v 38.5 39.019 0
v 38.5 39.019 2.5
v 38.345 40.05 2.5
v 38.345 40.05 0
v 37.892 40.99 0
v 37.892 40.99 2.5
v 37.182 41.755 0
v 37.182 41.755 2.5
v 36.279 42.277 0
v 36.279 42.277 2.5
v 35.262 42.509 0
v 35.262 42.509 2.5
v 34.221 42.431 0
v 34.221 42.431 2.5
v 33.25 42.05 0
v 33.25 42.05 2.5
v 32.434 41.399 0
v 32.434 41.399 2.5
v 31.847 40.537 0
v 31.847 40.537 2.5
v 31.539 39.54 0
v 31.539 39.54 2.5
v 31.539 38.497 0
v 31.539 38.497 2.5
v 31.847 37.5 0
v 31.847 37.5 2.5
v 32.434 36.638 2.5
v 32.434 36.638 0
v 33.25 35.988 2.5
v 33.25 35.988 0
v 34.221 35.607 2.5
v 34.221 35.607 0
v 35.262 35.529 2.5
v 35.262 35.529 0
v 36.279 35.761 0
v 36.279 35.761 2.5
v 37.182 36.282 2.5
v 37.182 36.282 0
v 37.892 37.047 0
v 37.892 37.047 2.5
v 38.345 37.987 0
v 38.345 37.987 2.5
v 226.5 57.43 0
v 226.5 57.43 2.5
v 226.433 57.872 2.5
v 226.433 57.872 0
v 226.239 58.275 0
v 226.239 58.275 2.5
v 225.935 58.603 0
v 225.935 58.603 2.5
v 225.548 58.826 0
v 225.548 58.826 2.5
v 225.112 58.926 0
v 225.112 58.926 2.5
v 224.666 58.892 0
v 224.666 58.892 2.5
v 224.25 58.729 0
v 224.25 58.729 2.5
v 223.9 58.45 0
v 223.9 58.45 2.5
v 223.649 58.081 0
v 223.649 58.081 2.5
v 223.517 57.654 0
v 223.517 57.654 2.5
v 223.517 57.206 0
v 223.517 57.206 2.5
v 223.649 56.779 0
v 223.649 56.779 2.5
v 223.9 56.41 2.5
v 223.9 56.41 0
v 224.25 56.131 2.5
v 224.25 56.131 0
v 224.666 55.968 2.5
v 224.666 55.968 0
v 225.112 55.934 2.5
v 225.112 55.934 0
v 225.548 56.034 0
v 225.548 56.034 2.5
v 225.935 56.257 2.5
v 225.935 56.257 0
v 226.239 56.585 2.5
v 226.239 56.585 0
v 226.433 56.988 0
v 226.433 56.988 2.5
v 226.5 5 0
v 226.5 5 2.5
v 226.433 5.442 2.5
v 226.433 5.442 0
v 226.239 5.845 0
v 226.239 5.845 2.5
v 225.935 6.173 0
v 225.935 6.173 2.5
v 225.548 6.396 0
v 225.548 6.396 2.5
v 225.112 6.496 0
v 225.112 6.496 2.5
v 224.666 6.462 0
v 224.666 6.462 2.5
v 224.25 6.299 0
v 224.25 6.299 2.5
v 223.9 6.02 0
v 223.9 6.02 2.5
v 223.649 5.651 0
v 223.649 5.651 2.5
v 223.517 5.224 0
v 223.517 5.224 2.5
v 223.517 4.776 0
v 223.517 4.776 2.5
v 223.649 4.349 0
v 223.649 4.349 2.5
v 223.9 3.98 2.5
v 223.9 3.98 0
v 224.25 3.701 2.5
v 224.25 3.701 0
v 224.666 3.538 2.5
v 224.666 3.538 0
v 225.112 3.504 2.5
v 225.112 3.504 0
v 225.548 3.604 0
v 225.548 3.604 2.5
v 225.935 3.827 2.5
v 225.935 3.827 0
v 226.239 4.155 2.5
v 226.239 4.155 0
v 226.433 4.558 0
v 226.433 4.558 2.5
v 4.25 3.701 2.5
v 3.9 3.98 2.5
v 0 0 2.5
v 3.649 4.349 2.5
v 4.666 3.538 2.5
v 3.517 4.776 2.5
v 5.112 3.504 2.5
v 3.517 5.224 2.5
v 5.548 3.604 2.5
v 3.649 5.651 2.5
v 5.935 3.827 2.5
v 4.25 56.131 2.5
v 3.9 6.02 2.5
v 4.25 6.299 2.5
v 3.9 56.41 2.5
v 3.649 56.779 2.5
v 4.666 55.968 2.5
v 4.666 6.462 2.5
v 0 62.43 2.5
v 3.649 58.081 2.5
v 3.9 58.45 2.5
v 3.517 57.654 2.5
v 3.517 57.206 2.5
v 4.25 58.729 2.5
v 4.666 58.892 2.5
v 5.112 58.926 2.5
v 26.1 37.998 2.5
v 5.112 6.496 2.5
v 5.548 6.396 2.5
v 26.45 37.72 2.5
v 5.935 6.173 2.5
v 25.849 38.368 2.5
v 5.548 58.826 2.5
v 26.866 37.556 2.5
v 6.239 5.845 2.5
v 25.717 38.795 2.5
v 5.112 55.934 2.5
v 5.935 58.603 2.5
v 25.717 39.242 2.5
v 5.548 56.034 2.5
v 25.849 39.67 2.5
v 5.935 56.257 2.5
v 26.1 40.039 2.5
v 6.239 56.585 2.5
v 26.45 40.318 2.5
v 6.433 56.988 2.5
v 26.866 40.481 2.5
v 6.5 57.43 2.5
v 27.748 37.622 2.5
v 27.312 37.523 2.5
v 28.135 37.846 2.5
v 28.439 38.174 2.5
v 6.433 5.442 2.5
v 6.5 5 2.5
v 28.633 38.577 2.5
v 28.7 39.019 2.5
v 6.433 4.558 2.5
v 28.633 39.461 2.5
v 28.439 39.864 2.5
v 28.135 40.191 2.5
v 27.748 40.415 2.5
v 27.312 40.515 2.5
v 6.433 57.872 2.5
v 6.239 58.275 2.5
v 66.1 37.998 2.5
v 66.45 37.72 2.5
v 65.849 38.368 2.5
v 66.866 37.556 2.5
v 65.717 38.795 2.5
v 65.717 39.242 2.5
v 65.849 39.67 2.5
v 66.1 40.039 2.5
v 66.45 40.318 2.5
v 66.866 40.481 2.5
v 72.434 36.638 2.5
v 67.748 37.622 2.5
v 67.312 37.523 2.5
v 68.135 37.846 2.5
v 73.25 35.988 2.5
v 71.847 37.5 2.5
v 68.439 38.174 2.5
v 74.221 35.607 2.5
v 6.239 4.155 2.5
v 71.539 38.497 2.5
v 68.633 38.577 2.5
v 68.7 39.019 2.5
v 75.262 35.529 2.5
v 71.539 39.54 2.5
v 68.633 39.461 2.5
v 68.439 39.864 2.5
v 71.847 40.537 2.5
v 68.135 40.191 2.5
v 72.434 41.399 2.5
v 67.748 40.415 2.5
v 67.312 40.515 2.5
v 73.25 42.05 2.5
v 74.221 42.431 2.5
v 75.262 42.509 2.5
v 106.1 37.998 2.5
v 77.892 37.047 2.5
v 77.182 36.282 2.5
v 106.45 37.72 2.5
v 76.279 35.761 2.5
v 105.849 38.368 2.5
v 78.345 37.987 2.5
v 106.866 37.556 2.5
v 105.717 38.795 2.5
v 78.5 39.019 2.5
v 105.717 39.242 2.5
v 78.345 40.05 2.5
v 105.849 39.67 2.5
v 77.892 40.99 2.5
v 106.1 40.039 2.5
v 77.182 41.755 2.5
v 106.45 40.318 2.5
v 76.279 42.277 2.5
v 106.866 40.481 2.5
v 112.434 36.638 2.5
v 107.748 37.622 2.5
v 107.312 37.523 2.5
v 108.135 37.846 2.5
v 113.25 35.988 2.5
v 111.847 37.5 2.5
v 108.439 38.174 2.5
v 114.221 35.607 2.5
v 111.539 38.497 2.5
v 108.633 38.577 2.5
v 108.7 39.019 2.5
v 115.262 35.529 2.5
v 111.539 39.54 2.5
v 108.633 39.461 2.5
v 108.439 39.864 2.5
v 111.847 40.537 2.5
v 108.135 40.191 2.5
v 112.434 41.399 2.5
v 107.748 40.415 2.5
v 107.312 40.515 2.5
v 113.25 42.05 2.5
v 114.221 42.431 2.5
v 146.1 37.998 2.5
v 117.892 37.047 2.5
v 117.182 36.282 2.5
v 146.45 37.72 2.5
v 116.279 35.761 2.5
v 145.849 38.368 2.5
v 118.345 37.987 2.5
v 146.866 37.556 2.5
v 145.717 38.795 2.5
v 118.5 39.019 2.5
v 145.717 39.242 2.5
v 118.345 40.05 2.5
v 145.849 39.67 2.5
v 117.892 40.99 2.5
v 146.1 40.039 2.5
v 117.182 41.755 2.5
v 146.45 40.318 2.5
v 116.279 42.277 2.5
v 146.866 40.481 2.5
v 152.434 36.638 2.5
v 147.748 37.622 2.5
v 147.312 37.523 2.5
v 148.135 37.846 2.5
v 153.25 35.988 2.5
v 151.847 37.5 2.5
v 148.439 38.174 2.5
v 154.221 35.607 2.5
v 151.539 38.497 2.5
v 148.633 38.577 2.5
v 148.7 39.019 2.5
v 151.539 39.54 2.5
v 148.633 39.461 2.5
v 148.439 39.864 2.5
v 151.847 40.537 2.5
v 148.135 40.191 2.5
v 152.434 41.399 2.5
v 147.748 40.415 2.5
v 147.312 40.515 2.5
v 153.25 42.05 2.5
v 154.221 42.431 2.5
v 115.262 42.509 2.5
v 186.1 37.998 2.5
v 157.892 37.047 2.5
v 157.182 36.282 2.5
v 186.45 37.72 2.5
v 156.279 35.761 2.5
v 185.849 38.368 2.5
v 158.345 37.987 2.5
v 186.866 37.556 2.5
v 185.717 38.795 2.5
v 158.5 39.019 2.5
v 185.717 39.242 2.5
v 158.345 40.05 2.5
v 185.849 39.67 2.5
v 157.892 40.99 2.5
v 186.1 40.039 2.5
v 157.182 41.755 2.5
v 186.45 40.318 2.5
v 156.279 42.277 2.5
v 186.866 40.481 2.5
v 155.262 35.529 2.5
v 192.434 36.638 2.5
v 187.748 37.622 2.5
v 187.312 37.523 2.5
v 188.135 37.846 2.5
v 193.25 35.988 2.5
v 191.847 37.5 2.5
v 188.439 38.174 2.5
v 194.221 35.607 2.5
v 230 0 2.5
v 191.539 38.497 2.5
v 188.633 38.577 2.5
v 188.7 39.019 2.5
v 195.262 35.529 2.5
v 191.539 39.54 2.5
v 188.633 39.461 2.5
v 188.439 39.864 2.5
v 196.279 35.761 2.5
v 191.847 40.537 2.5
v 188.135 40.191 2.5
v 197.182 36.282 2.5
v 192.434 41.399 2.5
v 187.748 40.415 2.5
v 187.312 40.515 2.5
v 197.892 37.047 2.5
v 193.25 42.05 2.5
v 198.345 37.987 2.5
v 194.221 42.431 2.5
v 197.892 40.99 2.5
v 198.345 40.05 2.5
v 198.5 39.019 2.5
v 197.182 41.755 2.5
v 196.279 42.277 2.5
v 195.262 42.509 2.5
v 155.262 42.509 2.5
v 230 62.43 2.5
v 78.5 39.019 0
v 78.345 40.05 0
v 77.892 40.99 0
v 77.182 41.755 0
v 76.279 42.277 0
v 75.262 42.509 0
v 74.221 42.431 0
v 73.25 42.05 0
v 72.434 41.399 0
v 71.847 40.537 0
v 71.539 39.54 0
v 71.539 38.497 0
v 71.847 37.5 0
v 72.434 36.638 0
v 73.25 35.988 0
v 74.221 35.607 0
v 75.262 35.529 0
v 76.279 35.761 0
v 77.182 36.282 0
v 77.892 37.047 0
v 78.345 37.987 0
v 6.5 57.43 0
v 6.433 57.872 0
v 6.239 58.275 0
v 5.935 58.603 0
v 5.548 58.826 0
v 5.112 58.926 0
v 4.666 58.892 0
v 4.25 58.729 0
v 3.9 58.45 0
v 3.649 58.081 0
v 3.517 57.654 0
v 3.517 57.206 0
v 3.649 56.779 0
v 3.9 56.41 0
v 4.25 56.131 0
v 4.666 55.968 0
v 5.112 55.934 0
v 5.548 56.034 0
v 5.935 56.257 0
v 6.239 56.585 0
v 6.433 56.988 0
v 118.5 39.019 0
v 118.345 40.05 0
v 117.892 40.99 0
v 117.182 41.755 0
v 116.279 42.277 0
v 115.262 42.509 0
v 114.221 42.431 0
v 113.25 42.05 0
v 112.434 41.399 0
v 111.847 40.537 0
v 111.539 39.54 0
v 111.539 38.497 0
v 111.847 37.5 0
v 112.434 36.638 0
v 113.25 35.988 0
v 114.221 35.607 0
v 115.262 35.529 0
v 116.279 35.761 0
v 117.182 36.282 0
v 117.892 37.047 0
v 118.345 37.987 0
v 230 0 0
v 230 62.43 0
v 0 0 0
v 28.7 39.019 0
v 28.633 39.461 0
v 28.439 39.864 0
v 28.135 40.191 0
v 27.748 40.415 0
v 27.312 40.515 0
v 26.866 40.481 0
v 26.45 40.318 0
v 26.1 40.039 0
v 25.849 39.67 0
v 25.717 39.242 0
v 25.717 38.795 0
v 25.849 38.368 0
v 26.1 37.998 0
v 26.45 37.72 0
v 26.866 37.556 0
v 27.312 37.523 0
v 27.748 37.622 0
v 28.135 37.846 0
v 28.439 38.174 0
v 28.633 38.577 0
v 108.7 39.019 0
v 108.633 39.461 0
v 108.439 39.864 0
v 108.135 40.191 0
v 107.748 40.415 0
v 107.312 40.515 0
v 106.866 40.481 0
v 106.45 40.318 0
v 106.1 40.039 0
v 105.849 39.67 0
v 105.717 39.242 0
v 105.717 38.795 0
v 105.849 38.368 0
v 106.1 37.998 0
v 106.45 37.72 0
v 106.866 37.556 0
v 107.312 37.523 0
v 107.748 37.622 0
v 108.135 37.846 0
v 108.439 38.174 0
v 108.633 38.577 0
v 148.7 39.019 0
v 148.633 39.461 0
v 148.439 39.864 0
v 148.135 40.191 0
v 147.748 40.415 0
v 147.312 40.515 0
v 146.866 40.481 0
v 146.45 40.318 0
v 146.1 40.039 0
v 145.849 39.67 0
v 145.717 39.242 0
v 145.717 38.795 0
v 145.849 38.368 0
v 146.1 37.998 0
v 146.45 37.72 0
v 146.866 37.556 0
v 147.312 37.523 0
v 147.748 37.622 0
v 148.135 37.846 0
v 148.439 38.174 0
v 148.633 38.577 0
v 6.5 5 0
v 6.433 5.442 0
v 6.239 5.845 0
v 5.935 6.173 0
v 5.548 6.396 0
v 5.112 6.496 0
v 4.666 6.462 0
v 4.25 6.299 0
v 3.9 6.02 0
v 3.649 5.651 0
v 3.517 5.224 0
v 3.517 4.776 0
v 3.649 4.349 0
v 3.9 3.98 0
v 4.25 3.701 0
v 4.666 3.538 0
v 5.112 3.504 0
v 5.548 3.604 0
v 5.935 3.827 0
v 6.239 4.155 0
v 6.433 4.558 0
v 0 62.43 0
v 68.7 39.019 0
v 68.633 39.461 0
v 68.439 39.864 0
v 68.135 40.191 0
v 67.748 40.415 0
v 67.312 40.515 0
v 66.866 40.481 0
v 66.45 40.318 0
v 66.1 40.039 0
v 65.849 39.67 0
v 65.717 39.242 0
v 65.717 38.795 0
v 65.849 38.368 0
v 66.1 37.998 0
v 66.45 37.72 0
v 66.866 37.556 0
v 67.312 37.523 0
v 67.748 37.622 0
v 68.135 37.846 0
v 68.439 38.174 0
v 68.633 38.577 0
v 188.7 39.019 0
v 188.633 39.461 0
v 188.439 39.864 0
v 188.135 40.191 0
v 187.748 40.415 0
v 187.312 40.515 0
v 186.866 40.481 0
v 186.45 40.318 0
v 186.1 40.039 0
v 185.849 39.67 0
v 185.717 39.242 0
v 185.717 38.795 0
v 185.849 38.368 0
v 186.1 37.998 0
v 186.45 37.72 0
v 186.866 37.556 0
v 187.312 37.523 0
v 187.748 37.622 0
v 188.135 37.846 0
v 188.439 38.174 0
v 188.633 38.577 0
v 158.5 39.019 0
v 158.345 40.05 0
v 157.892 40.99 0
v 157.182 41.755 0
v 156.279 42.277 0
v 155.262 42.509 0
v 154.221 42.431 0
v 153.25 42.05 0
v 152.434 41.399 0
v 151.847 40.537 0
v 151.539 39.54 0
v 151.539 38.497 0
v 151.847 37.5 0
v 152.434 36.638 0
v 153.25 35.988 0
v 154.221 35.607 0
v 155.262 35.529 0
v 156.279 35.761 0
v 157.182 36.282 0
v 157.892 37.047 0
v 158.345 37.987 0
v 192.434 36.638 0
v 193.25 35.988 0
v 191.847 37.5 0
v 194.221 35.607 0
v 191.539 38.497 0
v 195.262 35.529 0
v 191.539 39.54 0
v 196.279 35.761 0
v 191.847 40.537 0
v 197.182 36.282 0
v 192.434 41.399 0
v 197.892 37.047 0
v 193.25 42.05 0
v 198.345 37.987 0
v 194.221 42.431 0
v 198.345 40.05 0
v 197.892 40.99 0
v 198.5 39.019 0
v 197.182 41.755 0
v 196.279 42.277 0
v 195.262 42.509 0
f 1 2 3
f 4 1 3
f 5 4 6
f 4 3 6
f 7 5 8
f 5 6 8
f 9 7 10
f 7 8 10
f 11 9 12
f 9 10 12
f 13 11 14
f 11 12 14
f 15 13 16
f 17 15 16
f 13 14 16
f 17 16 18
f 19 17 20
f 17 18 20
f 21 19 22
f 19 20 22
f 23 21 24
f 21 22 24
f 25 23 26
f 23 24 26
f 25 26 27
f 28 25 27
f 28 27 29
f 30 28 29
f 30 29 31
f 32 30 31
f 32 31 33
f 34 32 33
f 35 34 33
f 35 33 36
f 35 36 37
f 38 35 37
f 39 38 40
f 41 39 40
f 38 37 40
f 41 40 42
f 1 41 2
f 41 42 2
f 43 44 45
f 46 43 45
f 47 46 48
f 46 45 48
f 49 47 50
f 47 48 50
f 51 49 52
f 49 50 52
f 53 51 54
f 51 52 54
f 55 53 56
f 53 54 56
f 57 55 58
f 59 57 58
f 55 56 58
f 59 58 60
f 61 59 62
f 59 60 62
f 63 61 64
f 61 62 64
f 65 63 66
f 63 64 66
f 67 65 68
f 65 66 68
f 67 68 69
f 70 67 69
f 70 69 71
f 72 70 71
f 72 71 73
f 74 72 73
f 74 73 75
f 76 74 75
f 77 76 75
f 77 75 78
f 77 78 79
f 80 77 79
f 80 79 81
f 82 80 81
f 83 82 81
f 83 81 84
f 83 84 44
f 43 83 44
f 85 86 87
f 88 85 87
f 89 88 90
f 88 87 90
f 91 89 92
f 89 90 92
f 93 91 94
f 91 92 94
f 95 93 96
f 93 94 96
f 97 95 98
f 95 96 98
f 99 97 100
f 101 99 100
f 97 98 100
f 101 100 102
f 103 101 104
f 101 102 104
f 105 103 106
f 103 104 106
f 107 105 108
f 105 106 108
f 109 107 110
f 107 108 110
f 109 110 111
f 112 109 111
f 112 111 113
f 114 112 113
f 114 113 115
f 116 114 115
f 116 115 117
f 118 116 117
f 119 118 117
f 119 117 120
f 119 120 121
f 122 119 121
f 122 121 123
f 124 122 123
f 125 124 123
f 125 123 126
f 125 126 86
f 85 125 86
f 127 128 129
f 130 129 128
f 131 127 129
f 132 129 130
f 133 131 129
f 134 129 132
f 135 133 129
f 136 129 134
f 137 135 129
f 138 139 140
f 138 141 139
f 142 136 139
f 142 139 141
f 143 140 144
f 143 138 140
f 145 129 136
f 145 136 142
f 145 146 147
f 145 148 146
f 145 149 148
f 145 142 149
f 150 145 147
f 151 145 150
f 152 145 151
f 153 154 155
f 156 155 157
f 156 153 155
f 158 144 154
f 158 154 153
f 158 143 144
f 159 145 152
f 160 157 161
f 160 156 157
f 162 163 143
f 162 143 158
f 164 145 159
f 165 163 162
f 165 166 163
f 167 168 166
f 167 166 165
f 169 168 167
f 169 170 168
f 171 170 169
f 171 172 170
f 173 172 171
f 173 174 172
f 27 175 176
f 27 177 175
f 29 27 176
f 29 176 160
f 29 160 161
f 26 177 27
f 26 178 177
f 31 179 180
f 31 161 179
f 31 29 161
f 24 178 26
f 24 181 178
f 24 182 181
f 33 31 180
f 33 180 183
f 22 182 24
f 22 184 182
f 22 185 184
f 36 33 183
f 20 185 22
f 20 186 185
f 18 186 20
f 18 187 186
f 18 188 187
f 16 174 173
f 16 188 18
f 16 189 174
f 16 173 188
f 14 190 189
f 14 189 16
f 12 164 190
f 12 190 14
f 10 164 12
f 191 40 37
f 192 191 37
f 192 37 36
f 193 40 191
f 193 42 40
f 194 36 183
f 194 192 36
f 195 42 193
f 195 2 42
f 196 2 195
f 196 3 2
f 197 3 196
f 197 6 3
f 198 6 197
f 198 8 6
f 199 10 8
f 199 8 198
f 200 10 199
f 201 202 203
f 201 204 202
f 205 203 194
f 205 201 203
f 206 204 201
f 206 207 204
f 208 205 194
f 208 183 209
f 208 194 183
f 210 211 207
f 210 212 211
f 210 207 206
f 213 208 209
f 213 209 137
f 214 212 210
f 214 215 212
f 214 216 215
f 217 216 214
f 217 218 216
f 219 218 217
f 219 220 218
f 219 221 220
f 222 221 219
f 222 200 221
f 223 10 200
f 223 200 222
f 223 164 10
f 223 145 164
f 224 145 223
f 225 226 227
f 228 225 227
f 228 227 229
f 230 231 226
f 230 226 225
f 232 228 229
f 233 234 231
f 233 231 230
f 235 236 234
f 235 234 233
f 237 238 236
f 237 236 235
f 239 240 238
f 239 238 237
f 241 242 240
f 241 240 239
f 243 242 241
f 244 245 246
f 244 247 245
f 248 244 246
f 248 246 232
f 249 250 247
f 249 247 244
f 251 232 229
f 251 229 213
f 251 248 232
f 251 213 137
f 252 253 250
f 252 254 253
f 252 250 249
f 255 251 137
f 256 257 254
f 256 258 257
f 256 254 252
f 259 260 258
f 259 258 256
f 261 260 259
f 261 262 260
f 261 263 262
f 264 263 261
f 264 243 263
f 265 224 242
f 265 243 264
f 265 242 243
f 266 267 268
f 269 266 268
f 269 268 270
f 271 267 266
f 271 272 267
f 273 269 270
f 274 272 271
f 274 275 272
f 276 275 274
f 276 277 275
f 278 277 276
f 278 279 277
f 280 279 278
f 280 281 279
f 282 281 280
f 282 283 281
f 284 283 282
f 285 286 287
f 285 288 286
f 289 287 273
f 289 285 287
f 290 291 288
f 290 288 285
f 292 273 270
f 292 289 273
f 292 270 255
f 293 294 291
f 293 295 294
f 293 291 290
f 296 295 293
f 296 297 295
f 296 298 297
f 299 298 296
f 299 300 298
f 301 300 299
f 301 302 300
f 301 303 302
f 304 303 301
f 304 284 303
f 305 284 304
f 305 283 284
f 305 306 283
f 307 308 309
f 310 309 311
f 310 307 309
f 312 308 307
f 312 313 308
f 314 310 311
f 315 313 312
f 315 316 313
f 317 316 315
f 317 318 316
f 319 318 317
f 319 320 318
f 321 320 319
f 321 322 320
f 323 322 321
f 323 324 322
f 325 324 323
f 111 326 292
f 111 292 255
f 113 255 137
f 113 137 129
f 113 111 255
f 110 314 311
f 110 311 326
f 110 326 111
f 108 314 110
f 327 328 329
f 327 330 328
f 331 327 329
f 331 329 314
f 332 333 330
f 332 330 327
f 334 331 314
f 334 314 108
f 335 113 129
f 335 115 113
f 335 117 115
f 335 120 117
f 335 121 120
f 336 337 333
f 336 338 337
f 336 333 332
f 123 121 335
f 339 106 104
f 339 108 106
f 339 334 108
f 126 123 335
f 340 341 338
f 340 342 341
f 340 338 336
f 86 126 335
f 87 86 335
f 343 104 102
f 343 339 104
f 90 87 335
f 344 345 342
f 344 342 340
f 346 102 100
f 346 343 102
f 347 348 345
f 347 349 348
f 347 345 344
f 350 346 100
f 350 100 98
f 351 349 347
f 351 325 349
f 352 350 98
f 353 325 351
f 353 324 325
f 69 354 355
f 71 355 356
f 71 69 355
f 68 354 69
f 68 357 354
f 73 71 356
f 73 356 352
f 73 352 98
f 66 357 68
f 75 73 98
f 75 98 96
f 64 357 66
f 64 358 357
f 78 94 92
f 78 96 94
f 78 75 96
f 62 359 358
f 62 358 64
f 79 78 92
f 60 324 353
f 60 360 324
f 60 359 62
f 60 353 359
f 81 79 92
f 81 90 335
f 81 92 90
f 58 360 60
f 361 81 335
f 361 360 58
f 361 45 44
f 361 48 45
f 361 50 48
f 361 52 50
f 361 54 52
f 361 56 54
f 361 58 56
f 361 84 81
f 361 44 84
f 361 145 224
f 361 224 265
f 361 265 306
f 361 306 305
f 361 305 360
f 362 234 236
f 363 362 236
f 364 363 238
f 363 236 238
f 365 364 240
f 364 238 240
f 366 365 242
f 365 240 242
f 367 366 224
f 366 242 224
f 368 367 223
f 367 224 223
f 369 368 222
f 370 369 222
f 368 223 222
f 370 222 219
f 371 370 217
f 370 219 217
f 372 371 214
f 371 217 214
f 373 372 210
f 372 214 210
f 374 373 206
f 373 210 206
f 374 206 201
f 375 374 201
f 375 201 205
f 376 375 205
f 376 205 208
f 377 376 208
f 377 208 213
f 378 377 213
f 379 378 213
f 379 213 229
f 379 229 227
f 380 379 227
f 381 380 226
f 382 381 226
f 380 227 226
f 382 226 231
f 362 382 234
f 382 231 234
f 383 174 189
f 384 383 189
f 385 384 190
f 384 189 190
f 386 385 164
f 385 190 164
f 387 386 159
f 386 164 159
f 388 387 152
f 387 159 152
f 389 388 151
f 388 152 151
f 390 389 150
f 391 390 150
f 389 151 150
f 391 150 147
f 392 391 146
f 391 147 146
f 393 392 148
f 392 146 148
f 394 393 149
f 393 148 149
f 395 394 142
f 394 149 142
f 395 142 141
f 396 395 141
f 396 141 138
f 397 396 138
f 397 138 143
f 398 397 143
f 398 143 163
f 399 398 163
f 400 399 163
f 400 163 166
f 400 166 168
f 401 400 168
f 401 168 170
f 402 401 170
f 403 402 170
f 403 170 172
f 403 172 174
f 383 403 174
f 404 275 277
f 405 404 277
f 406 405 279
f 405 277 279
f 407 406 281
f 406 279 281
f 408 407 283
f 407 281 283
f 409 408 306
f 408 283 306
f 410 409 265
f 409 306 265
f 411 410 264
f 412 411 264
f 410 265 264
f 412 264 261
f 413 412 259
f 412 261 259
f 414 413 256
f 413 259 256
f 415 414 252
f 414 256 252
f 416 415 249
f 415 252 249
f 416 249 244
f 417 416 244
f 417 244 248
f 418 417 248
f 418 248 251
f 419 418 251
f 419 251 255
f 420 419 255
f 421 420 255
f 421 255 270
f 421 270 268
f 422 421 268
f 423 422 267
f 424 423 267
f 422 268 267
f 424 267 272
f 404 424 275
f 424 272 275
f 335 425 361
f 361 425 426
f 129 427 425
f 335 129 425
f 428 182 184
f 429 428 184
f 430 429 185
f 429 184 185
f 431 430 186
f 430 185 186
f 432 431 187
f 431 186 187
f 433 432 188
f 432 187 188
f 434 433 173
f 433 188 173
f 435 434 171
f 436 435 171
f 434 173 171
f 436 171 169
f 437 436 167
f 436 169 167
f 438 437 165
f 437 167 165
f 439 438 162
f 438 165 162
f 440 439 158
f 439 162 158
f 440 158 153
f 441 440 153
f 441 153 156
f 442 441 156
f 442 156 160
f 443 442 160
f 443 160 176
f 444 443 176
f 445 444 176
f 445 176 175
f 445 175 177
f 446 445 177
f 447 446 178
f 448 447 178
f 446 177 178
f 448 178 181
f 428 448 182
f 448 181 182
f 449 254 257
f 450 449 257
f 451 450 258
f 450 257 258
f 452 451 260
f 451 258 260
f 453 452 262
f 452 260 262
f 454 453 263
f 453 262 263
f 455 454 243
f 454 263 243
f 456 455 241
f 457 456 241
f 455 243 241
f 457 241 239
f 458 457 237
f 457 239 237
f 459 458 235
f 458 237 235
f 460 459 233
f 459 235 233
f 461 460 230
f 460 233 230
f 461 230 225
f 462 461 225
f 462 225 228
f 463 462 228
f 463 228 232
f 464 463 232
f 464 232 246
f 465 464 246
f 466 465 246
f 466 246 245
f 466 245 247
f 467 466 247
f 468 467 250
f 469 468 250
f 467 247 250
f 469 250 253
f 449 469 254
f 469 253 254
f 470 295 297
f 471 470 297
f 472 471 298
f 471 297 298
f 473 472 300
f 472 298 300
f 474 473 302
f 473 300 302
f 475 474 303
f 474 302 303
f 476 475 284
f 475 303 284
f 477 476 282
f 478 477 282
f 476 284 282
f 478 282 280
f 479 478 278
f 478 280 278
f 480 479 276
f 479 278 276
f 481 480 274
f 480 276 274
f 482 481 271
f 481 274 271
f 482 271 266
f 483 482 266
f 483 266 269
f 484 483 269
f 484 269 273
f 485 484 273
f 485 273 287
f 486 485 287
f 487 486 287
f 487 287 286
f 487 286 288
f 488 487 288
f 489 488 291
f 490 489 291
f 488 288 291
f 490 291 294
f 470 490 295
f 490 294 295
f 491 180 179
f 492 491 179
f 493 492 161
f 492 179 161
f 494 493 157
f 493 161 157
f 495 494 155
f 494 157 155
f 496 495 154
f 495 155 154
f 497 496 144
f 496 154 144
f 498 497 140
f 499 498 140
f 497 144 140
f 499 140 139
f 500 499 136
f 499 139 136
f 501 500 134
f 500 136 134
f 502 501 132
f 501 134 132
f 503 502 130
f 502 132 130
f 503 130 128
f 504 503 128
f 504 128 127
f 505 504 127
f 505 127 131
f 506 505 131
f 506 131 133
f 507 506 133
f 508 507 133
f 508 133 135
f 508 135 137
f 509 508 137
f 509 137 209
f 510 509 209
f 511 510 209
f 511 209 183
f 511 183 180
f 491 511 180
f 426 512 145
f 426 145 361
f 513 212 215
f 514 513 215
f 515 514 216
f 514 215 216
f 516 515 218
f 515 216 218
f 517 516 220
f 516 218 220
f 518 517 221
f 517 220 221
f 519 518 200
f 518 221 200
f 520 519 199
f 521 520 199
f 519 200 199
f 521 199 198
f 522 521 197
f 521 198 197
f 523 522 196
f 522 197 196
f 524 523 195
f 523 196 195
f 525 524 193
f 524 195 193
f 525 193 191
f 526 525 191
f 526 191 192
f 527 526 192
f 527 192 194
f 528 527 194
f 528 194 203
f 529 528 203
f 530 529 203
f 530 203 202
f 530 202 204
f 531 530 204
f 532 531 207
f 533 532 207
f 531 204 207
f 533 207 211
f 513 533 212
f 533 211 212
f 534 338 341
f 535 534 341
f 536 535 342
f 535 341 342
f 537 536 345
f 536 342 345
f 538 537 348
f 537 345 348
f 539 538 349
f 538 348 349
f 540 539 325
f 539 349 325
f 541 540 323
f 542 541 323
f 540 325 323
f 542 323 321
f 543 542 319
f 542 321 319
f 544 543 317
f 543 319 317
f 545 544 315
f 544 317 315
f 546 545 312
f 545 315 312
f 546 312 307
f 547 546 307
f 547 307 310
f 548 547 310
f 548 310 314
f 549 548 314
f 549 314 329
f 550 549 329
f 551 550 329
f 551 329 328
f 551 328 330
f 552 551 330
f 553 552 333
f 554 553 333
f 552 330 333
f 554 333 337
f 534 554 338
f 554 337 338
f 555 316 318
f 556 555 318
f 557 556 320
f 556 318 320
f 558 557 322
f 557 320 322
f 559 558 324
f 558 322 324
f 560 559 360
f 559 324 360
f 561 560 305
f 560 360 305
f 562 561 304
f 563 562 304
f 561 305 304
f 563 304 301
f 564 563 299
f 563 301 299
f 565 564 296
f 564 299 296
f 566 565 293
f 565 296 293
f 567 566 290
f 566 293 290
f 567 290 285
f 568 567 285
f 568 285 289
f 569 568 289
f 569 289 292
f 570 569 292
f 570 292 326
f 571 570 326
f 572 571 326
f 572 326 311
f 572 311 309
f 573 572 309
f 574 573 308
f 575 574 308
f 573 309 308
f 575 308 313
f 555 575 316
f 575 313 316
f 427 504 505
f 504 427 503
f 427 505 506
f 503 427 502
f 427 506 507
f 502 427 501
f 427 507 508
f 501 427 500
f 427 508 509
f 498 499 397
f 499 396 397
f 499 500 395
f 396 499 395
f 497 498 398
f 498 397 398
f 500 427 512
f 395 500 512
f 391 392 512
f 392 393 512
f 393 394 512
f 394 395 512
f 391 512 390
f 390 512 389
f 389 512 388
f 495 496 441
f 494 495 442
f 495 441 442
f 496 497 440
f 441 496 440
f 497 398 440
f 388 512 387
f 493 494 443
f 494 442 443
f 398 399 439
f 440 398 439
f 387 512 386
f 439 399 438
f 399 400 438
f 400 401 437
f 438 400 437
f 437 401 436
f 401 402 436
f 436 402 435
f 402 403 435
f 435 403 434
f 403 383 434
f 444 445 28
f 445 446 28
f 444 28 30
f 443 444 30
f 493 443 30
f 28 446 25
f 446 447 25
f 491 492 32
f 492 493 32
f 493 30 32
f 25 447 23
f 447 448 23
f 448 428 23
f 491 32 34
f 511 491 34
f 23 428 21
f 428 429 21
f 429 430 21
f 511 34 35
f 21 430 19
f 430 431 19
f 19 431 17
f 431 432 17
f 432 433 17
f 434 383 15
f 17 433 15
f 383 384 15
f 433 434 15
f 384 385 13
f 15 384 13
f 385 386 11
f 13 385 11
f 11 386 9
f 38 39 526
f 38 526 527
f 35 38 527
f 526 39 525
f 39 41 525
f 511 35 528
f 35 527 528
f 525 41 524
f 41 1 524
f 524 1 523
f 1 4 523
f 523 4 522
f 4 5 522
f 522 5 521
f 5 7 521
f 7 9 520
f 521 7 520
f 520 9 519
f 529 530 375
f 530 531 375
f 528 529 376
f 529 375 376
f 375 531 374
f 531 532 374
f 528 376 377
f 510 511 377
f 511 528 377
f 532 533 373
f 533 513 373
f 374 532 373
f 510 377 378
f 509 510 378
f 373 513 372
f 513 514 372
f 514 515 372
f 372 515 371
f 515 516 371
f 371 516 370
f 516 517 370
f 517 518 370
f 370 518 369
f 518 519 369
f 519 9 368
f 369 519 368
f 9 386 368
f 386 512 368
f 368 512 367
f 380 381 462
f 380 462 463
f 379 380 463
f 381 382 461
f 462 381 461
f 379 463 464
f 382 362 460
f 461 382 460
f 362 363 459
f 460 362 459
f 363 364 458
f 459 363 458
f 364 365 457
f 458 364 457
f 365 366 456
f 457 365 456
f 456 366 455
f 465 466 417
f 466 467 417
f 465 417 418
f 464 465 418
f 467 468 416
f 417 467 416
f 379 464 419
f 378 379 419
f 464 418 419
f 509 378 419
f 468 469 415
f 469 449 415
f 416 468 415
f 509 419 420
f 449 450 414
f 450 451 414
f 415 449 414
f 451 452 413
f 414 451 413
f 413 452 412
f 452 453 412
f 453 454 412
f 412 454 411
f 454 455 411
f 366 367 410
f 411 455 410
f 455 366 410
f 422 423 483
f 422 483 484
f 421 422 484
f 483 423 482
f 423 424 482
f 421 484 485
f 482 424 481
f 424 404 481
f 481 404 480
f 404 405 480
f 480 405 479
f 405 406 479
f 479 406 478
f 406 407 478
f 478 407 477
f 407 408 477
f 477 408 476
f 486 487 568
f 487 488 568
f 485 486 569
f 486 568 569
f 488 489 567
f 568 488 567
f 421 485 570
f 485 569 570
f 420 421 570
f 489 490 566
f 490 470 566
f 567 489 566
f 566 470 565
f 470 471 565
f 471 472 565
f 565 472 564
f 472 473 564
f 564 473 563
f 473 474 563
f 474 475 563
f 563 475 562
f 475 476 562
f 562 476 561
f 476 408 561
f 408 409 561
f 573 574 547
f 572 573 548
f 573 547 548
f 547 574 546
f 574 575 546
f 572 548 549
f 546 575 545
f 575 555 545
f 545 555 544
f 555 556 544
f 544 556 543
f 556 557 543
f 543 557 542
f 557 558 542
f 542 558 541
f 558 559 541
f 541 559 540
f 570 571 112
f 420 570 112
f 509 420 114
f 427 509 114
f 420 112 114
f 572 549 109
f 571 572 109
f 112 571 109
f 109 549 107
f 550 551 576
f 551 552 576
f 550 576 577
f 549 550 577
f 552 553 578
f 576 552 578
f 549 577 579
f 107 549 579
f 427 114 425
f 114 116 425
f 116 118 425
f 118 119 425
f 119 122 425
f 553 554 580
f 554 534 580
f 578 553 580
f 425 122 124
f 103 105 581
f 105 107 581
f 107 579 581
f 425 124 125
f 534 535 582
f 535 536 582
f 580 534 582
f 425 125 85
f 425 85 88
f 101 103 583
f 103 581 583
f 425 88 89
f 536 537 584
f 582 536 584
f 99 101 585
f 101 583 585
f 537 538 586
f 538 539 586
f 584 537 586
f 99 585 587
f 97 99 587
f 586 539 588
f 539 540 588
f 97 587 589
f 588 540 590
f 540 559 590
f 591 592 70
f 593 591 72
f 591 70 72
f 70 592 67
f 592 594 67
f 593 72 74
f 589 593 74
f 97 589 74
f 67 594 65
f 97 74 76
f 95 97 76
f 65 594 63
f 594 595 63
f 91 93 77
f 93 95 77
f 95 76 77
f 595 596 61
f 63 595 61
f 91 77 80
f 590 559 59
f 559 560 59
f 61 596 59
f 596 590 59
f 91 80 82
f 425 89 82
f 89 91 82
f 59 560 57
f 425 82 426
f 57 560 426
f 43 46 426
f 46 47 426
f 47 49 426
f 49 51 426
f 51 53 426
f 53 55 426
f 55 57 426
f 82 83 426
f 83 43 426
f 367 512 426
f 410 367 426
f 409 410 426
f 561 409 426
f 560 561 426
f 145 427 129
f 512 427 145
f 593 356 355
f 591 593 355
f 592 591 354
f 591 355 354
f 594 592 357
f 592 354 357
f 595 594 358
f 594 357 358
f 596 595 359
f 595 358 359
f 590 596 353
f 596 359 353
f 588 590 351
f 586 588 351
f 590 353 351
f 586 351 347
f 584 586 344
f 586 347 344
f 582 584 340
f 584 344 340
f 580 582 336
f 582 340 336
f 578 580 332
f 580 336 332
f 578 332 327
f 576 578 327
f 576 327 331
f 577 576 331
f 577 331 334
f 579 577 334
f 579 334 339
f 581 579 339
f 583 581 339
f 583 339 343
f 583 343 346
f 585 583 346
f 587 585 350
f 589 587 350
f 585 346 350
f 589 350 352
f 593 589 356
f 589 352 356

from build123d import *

# Parameters (mm, degrees)
SKETCH1_W           = 230
SKETCH1_H           = 62.43
BOSS_EXTRUDE1_DEPTH = 2.5
SKETCH2_R           = 1.5
CUT_EXTRUDE1_DEPTH  = 10
SKETCH3_R           = 3.5
SKETCH3_R_2         = 1.5
CUT_EXTRUDE2_DEPTH  = 2.5


with BuildPart() as part:
    # Sketch1 → Boss-Extrude1 (new body)
    with BuildSketch(Plane.XY):
        with Locations((115, 31.215)):
            Rectangle(SKETCH1_W, SKETCH1_H)
    extrude(amount=BOSS_EXTRUDE1_DEPTH)

    # Sketch2 → Cut-Extrude1 (cut)
    with BuildSketch(Plane.XY.offset(2.5)):
        with Locations((5, 57.43)):
            Circle(SKETCH2_R)
        with Locations((5, 5)):
            Circle(SKETCH2_R)
        with Locations((225, 5)):
            Circle(SKETCH2_R)
        with Locations((225, 57.43)):
            Circle(SKETCH2_R)
    extrude(amount=-CUT_EXTRUDE1_DEPTH, mode=Mode.SUBTRACT)

    # Sketch3 → Cut-Extrude2 (cut)
    with BuildSketch(Plane.XY.offset(2.5)):
        with Locations((115, 39.01875)):
            Circle(SKETCH3_R)
        with Locations((107.2, 39.01875)):
            Circle(SKETCH3_R_2)
        with Locations((155, 39.01875)):
            Circle(SKETCH3_R)
        with Locations((147.2, 39.01875)):
            Circle(SKETCH3_R_2)
        with Locations((195, 39.01875)):
            Circle(SKETCH3_R)
        with Locations((187.2, 39.01875)):
            Circle(SKETCH3_R_2)
        with Locations((67.2, 39.01875)):
            Circle(SKETCH3_R_2)
        with Locations((75, 39.01875)):
            Circle(SKETCH3_R)
        with Locations((27.2, 39.01875)):
            Circle(SKETCH3_R_2)
        with Locations((35, 39.01875)):
            Circle(SKETCH3_R)
    extrude(amount=-CUT_EXTRUDE2_DEPTH, mode=Mode.SUBTRACT)


solid = part.part
